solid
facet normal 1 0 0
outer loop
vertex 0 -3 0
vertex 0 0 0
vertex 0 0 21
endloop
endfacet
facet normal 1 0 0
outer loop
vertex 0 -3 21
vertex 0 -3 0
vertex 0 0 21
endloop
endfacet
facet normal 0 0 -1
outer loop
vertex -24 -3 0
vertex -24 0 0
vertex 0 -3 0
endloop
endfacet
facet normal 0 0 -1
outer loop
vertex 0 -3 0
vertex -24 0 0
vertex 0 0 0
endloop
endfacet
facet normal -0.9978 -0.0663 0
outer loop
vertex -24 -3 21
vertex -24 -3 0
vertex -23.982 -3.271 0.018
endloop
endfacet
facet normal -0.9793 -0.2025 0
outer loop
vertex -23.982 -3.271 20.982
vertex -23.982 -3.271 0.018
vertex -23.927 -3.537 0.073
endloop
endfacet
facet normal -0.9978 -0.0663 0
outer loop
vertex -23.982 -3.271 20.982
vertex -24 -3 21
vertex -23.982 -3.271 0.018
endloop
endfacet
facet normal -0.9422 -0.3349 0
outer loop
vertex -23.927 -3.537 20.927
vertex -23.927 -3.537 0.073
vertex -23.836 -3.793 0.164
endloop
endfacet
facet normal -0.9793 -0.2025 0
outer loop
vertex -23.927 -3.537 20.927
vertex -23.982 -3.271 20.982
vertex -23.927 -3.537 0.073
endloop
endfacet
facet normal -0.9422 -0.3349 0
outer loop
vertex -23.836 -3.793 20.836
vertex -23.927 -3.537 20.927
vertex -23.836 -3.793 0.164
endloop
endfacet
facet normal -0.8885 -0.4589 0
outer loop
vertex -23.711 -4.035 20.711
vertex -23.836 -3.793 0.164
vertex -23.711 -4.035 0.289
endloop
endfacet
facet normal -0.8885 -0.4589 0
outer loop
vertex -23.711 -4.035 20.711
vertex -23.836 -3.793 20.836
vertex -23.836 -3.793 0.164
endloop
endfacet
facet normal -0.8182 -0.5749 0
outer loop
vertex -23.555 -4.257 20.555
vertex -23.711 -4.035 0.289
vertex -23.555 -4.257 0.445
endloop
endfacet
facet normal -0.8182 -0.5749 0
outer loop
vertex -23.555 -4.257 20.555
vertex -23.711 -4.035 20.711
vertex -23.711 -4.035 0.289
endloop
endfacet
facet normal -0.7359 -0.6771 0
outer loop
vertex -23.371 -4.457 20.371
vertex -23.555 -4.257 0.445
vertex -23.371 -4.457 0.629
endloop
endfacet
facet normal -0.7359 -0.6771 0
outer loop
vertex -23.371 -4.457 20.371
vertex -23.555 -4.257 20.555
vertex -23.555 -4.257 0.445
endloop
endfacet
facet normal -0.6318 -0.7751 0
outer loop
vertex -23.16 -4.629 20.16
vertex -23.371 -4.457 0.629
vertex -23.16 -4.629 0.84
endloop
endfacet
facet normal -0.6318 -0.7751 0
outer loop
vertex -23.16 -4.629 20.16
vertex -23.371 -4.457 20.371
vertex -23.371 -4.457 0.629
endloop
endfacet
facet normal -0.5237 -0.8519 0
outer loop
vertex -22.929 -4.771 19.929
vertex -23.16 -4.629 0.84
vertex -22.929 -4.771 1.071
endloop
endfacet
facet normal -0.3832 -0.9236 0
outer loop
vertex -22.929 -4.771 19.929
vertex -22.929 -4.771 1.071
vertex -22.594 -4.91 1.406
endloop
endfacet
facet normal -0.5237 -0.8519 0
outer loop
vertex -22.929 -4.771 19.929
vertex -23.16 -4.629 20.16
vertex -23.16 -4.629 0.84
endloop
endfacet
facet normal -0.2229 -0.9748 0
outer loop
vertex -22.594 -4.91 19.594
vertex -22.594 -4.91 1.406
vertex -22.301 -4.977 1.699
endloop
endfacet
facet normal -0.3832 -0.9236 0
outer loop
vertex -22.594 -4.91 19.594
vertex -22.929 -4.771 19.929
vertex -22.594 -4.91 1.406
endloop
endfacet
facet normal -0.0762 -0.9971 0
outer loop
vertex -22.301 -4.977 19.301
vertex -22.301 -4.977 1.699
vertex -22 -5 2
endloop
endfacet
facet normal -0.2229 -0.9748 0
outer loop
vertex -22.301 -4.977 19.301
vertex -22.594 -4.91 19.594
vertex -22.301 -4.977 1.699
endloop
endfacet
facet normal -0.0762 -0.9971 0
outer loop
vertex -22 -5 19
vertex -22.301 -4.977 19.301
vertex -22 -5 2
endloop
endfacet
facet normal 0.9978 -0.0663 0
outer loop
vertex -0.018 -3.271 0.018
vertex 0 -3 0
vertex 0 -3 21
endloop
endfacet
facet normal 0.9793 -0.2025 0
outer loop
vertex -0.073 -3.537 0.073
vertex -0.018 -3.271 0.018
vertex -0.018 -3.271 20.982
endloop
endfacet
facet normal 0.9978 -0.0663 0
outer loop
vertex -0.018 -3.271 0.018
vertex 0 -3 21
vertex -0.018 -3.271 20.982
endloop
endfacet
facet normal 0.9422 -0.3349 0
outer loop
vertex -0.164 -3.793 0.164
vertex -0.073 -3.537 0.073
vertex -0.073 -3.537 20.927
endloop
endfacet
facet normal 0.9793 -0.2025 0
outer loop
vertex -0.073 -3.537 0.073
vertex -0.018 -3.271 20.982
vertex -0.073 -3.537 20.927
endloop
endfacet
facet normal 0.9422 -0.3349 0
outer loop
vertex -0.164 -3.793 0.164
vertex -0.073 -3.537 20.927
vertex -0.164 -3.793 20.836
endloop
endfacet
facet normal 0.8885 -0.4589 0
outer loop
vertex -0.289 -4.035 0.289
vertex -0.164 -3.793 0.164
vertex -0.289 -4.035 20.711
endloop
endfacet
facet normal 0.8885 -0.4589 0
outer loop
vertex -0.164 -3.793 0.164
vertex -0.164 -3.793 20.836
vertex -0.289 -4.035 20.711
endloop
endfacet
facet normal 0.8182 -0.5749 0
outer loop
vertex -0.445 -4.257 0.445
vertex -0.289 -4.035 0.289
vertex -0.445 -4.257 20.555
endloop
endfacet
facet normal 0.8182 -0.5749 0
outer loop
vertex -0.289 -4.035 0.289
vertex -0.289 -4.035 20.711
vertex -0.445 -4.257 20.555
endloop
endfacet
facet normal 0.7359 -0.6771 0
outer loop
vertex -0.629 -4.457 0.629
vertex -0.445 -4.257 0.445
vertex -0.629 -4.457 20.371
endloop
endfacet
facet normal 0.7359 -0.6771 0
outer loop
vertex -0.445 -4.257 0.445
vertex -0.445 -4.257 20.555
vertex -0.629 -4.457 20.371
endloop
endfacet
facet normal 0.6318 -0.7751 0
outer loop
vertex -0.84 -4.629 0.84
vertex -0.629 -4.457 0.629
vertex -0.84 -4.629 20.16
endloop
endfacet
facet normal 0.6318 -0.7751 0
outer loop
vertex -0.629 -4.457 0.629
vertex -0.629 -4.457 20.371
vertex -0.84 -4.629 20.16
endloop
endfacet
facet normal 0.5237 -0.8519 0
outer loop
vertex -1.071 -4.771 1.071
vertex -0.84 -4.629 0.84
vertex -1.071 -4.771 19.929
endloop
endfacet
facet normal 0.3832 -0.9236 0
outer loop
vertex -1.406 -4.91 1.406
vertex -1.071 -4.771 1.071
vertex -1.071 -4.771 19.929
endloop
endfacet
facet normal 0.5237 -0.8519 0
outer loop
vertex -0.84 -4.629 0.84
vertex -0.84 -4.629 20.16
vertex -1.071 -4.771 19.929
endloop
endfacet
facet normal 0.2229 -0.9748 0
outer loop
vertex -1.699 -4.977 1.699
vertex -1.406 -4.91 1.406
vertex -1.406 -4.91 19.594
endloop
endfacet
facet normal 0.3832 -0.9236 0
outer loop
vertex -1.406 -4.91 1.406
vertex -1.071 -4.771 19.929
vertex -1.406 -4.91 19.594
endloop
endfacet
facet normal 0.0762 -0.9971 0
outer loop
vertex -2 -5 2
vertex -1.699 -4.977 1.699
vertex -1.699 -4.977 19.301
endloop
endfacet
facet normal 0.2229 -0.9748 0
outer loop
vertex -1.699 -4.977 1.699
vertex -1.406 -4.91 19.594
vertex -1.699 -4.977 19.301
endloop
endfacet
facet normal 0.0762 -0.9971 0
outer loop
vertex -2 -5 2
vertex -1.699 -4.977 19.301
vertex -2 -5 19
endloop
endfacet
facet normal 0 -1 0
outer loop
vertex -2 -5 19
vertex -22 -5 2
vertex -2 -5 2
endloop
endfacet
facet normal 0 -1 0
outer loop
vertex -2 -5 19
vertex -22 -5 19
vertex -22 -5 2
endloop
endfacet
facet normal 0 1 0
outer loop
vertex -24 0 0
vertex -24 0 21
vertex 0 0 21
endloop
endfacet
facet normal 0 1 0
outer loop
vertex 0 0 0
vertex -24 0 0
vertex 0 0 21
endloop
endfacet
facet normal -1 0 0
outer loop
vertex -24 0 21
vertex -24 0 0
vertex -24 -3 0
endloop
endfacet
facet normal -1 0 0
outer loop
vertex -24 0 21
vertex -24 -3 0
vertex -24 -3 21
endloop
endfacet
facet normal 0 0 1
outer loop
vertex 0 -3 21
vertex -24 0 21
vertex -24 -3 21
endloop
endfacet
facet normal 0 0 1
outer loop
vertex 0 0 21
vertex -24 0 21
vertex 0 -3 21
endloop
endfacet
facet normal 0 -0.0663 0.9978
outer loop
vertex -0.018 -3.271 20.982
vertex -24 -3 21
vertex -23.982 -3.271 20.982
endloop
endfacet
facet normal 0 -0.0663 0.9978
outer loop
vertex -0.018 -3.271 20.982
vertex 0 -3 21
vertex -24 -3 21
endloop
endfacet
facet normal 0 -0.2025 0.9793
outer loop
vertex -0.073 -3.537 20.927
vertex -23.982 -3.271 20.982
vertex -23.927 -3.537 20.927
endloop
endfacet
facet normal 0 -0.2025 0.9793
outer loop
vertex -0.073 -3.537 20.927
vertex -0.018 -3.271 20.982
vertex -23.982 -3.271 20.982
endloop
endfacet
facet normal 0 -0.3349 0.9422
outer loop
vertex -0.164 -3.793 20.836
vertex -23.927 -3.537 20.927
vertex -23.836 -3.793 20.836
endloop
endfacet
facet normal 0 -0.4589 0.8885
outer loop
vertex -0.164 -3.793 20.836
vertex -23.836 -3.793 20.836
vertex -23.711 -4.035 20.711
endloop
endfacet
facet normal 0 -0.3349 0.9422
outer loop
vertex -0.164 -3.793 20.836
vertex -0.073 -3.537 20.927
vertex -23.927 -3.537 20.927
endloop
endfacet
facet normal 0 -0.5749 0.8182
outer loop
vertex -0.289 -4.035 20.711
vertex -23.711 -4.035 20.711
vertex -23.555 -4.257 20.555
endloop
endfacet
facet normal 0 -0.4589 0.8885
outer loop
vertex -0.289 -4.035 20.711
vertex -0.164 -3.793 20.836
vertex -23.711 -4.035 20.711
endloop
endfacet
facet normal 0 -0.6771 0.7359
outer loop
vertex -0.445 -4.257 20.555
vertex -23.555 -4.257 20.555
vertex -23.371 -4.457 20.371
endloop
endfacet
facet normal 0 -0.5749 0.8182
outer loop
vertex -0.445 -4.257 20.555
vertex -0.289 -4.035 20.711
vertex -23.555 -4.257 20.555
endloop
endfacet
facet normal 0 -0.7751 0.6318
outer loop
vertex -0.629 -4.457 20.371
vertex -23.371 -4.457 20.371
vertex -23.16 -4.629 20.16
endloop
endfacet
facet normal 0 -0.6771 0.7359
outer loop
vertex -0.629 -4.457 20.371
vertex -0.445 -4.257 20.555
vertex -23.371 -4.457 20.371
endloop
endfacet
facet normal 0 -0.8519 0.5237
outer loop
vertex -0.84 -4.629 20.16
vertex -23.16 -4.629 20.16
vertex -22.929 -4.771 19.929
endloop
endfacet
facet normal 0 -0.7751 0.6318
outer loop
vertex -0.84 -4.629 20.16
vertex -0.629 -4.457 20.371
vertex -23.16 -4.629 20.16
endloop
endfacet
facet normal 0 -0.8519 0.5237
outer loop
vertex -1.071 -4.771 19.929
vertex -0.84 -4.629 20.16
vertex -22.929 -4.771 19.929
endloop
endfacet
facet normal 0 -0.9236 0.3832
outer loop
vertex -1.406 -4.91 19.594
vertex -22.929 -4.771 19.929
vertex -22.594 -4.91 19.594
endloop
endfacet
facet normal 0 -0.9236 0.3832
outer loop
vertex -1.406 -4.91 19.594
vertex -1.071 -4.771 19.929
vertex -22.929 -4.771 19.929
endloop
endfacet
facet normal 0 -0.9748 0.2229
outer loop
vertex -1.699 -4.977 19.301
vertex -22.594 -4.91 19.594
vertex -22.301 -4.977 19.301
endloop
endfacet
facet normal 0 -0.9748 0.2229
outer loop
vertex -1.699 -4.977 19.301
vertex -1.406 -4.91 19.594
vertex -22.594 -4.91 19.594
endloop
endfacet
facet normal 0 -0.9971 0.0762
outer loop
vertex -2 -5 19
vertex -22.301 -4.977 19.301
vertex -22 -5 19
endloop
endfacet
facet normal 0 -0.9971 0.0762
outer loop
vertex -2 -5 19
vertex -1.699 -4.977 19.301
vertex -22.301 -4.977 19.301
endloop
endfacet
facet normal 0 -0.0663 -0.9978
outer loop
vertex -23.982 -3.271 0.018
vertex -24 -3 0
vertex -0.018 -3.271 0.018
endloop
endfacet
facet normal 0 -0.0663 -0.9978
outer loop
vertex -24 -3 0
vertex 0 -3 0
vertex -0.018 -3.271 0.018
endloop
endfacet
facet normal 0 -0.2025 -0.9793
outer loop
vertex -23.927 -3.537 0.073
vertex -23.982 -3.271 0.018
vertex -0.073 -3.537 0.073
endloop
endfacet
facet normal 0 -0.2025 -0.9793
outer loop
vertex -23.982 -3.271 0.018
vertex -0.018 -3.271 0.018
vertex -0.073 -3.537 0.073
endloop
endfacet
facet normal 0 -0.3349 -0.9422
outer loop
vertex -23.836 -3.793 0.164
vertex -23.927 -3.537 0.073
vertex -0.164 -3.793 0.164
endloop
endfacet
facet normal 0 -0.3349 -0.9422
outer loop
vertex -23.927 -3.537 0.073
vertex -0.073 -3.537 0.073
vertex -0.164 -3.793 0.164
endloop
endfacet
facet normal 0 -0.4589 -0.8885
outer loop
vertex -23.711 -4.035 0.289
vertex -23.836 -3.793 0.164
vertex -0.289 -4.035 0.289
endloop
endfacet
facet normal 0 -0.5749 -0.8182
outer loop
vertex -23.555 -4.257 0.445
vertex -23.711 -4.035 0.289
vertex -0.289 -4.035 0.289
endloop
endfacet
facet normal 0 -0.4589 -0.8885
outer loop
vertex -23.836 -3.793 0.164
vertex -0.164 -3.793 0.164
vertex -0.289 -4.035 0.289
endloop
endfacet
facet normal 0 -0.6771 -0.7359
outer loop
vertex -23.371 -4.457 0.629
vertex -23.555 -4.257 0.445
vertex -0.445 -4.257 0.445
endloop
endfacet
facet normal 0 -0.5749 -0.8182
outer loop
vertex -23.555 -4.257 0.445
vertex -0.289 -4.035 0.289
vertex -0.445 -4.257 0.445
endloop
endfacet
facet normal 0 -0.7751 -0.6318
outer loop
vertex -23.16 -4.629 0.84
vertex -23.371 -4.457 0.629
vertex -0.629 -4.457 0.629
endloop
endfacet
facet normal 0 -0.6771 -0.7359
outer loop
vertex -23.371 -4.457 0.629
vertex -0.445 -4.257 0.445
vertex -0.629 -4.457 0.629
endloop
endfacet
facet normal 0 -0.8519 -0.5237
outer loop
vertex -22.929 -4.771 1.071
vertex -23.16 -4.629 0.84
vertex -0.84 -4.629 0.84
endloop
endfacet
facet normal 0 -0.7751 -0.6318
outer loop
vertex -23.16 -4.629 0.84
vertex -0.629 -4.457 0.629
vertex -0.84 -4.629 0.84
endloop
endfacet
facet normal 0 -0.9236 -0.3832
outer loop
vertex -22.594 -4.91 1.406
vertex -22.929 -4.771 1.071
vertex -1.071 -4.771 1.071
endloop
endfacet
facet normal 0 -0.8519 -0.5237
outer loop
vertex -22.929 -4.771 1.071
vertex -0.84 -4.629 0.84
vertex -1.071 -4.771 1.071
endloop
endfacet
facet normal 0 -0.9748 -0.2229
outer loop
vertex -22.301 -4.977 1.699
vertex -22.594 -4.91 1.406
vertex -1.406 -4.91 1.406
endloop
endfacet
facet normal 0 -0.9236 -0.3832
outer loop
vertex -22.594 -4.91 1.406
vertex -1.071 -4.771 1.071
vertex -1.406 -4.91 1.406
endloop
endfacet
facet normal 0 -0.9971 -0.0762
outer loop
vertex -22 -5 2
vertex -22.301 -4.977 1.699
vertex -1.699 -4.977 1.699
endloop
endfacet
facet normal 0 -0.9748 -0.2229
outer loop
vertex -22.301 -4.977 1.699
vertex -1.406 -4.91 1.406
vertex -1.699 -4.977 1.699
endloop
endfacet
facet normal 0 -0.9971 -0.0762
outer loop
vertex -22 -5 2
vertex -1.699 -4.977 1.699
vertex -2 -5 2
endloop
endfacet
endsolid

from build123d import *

# Parameters (mm, degrees)
F0_W     = 24
F0_H     = 21
F1_DEPTH = 5
F2_R     = 2


# Not quite as in the source:
# - a feature of the source that left no trace in its solid (it failed there, or was rolled back) is left out


with BuildPart() as f1:
    # F0 (on Front) → F1 (new body)
    with BuildSketch(Plane.XZ):
        with Locations((-12, 10.5)):
            Rectangle(F0_W, F0_H)
    extrude(amount=F1_DEPTH)

    # F2
    f2_edges = [f1.edges().sort_by_distance(p)[0] for p in [
        (-12, -5, 0),
        (0, -5, 10.5),
        (-12, -5, 21),
        (-24, -5, 10.5),
    ]]
    fillet(f2_edges, radius=F2_R)


solid = f1.part
